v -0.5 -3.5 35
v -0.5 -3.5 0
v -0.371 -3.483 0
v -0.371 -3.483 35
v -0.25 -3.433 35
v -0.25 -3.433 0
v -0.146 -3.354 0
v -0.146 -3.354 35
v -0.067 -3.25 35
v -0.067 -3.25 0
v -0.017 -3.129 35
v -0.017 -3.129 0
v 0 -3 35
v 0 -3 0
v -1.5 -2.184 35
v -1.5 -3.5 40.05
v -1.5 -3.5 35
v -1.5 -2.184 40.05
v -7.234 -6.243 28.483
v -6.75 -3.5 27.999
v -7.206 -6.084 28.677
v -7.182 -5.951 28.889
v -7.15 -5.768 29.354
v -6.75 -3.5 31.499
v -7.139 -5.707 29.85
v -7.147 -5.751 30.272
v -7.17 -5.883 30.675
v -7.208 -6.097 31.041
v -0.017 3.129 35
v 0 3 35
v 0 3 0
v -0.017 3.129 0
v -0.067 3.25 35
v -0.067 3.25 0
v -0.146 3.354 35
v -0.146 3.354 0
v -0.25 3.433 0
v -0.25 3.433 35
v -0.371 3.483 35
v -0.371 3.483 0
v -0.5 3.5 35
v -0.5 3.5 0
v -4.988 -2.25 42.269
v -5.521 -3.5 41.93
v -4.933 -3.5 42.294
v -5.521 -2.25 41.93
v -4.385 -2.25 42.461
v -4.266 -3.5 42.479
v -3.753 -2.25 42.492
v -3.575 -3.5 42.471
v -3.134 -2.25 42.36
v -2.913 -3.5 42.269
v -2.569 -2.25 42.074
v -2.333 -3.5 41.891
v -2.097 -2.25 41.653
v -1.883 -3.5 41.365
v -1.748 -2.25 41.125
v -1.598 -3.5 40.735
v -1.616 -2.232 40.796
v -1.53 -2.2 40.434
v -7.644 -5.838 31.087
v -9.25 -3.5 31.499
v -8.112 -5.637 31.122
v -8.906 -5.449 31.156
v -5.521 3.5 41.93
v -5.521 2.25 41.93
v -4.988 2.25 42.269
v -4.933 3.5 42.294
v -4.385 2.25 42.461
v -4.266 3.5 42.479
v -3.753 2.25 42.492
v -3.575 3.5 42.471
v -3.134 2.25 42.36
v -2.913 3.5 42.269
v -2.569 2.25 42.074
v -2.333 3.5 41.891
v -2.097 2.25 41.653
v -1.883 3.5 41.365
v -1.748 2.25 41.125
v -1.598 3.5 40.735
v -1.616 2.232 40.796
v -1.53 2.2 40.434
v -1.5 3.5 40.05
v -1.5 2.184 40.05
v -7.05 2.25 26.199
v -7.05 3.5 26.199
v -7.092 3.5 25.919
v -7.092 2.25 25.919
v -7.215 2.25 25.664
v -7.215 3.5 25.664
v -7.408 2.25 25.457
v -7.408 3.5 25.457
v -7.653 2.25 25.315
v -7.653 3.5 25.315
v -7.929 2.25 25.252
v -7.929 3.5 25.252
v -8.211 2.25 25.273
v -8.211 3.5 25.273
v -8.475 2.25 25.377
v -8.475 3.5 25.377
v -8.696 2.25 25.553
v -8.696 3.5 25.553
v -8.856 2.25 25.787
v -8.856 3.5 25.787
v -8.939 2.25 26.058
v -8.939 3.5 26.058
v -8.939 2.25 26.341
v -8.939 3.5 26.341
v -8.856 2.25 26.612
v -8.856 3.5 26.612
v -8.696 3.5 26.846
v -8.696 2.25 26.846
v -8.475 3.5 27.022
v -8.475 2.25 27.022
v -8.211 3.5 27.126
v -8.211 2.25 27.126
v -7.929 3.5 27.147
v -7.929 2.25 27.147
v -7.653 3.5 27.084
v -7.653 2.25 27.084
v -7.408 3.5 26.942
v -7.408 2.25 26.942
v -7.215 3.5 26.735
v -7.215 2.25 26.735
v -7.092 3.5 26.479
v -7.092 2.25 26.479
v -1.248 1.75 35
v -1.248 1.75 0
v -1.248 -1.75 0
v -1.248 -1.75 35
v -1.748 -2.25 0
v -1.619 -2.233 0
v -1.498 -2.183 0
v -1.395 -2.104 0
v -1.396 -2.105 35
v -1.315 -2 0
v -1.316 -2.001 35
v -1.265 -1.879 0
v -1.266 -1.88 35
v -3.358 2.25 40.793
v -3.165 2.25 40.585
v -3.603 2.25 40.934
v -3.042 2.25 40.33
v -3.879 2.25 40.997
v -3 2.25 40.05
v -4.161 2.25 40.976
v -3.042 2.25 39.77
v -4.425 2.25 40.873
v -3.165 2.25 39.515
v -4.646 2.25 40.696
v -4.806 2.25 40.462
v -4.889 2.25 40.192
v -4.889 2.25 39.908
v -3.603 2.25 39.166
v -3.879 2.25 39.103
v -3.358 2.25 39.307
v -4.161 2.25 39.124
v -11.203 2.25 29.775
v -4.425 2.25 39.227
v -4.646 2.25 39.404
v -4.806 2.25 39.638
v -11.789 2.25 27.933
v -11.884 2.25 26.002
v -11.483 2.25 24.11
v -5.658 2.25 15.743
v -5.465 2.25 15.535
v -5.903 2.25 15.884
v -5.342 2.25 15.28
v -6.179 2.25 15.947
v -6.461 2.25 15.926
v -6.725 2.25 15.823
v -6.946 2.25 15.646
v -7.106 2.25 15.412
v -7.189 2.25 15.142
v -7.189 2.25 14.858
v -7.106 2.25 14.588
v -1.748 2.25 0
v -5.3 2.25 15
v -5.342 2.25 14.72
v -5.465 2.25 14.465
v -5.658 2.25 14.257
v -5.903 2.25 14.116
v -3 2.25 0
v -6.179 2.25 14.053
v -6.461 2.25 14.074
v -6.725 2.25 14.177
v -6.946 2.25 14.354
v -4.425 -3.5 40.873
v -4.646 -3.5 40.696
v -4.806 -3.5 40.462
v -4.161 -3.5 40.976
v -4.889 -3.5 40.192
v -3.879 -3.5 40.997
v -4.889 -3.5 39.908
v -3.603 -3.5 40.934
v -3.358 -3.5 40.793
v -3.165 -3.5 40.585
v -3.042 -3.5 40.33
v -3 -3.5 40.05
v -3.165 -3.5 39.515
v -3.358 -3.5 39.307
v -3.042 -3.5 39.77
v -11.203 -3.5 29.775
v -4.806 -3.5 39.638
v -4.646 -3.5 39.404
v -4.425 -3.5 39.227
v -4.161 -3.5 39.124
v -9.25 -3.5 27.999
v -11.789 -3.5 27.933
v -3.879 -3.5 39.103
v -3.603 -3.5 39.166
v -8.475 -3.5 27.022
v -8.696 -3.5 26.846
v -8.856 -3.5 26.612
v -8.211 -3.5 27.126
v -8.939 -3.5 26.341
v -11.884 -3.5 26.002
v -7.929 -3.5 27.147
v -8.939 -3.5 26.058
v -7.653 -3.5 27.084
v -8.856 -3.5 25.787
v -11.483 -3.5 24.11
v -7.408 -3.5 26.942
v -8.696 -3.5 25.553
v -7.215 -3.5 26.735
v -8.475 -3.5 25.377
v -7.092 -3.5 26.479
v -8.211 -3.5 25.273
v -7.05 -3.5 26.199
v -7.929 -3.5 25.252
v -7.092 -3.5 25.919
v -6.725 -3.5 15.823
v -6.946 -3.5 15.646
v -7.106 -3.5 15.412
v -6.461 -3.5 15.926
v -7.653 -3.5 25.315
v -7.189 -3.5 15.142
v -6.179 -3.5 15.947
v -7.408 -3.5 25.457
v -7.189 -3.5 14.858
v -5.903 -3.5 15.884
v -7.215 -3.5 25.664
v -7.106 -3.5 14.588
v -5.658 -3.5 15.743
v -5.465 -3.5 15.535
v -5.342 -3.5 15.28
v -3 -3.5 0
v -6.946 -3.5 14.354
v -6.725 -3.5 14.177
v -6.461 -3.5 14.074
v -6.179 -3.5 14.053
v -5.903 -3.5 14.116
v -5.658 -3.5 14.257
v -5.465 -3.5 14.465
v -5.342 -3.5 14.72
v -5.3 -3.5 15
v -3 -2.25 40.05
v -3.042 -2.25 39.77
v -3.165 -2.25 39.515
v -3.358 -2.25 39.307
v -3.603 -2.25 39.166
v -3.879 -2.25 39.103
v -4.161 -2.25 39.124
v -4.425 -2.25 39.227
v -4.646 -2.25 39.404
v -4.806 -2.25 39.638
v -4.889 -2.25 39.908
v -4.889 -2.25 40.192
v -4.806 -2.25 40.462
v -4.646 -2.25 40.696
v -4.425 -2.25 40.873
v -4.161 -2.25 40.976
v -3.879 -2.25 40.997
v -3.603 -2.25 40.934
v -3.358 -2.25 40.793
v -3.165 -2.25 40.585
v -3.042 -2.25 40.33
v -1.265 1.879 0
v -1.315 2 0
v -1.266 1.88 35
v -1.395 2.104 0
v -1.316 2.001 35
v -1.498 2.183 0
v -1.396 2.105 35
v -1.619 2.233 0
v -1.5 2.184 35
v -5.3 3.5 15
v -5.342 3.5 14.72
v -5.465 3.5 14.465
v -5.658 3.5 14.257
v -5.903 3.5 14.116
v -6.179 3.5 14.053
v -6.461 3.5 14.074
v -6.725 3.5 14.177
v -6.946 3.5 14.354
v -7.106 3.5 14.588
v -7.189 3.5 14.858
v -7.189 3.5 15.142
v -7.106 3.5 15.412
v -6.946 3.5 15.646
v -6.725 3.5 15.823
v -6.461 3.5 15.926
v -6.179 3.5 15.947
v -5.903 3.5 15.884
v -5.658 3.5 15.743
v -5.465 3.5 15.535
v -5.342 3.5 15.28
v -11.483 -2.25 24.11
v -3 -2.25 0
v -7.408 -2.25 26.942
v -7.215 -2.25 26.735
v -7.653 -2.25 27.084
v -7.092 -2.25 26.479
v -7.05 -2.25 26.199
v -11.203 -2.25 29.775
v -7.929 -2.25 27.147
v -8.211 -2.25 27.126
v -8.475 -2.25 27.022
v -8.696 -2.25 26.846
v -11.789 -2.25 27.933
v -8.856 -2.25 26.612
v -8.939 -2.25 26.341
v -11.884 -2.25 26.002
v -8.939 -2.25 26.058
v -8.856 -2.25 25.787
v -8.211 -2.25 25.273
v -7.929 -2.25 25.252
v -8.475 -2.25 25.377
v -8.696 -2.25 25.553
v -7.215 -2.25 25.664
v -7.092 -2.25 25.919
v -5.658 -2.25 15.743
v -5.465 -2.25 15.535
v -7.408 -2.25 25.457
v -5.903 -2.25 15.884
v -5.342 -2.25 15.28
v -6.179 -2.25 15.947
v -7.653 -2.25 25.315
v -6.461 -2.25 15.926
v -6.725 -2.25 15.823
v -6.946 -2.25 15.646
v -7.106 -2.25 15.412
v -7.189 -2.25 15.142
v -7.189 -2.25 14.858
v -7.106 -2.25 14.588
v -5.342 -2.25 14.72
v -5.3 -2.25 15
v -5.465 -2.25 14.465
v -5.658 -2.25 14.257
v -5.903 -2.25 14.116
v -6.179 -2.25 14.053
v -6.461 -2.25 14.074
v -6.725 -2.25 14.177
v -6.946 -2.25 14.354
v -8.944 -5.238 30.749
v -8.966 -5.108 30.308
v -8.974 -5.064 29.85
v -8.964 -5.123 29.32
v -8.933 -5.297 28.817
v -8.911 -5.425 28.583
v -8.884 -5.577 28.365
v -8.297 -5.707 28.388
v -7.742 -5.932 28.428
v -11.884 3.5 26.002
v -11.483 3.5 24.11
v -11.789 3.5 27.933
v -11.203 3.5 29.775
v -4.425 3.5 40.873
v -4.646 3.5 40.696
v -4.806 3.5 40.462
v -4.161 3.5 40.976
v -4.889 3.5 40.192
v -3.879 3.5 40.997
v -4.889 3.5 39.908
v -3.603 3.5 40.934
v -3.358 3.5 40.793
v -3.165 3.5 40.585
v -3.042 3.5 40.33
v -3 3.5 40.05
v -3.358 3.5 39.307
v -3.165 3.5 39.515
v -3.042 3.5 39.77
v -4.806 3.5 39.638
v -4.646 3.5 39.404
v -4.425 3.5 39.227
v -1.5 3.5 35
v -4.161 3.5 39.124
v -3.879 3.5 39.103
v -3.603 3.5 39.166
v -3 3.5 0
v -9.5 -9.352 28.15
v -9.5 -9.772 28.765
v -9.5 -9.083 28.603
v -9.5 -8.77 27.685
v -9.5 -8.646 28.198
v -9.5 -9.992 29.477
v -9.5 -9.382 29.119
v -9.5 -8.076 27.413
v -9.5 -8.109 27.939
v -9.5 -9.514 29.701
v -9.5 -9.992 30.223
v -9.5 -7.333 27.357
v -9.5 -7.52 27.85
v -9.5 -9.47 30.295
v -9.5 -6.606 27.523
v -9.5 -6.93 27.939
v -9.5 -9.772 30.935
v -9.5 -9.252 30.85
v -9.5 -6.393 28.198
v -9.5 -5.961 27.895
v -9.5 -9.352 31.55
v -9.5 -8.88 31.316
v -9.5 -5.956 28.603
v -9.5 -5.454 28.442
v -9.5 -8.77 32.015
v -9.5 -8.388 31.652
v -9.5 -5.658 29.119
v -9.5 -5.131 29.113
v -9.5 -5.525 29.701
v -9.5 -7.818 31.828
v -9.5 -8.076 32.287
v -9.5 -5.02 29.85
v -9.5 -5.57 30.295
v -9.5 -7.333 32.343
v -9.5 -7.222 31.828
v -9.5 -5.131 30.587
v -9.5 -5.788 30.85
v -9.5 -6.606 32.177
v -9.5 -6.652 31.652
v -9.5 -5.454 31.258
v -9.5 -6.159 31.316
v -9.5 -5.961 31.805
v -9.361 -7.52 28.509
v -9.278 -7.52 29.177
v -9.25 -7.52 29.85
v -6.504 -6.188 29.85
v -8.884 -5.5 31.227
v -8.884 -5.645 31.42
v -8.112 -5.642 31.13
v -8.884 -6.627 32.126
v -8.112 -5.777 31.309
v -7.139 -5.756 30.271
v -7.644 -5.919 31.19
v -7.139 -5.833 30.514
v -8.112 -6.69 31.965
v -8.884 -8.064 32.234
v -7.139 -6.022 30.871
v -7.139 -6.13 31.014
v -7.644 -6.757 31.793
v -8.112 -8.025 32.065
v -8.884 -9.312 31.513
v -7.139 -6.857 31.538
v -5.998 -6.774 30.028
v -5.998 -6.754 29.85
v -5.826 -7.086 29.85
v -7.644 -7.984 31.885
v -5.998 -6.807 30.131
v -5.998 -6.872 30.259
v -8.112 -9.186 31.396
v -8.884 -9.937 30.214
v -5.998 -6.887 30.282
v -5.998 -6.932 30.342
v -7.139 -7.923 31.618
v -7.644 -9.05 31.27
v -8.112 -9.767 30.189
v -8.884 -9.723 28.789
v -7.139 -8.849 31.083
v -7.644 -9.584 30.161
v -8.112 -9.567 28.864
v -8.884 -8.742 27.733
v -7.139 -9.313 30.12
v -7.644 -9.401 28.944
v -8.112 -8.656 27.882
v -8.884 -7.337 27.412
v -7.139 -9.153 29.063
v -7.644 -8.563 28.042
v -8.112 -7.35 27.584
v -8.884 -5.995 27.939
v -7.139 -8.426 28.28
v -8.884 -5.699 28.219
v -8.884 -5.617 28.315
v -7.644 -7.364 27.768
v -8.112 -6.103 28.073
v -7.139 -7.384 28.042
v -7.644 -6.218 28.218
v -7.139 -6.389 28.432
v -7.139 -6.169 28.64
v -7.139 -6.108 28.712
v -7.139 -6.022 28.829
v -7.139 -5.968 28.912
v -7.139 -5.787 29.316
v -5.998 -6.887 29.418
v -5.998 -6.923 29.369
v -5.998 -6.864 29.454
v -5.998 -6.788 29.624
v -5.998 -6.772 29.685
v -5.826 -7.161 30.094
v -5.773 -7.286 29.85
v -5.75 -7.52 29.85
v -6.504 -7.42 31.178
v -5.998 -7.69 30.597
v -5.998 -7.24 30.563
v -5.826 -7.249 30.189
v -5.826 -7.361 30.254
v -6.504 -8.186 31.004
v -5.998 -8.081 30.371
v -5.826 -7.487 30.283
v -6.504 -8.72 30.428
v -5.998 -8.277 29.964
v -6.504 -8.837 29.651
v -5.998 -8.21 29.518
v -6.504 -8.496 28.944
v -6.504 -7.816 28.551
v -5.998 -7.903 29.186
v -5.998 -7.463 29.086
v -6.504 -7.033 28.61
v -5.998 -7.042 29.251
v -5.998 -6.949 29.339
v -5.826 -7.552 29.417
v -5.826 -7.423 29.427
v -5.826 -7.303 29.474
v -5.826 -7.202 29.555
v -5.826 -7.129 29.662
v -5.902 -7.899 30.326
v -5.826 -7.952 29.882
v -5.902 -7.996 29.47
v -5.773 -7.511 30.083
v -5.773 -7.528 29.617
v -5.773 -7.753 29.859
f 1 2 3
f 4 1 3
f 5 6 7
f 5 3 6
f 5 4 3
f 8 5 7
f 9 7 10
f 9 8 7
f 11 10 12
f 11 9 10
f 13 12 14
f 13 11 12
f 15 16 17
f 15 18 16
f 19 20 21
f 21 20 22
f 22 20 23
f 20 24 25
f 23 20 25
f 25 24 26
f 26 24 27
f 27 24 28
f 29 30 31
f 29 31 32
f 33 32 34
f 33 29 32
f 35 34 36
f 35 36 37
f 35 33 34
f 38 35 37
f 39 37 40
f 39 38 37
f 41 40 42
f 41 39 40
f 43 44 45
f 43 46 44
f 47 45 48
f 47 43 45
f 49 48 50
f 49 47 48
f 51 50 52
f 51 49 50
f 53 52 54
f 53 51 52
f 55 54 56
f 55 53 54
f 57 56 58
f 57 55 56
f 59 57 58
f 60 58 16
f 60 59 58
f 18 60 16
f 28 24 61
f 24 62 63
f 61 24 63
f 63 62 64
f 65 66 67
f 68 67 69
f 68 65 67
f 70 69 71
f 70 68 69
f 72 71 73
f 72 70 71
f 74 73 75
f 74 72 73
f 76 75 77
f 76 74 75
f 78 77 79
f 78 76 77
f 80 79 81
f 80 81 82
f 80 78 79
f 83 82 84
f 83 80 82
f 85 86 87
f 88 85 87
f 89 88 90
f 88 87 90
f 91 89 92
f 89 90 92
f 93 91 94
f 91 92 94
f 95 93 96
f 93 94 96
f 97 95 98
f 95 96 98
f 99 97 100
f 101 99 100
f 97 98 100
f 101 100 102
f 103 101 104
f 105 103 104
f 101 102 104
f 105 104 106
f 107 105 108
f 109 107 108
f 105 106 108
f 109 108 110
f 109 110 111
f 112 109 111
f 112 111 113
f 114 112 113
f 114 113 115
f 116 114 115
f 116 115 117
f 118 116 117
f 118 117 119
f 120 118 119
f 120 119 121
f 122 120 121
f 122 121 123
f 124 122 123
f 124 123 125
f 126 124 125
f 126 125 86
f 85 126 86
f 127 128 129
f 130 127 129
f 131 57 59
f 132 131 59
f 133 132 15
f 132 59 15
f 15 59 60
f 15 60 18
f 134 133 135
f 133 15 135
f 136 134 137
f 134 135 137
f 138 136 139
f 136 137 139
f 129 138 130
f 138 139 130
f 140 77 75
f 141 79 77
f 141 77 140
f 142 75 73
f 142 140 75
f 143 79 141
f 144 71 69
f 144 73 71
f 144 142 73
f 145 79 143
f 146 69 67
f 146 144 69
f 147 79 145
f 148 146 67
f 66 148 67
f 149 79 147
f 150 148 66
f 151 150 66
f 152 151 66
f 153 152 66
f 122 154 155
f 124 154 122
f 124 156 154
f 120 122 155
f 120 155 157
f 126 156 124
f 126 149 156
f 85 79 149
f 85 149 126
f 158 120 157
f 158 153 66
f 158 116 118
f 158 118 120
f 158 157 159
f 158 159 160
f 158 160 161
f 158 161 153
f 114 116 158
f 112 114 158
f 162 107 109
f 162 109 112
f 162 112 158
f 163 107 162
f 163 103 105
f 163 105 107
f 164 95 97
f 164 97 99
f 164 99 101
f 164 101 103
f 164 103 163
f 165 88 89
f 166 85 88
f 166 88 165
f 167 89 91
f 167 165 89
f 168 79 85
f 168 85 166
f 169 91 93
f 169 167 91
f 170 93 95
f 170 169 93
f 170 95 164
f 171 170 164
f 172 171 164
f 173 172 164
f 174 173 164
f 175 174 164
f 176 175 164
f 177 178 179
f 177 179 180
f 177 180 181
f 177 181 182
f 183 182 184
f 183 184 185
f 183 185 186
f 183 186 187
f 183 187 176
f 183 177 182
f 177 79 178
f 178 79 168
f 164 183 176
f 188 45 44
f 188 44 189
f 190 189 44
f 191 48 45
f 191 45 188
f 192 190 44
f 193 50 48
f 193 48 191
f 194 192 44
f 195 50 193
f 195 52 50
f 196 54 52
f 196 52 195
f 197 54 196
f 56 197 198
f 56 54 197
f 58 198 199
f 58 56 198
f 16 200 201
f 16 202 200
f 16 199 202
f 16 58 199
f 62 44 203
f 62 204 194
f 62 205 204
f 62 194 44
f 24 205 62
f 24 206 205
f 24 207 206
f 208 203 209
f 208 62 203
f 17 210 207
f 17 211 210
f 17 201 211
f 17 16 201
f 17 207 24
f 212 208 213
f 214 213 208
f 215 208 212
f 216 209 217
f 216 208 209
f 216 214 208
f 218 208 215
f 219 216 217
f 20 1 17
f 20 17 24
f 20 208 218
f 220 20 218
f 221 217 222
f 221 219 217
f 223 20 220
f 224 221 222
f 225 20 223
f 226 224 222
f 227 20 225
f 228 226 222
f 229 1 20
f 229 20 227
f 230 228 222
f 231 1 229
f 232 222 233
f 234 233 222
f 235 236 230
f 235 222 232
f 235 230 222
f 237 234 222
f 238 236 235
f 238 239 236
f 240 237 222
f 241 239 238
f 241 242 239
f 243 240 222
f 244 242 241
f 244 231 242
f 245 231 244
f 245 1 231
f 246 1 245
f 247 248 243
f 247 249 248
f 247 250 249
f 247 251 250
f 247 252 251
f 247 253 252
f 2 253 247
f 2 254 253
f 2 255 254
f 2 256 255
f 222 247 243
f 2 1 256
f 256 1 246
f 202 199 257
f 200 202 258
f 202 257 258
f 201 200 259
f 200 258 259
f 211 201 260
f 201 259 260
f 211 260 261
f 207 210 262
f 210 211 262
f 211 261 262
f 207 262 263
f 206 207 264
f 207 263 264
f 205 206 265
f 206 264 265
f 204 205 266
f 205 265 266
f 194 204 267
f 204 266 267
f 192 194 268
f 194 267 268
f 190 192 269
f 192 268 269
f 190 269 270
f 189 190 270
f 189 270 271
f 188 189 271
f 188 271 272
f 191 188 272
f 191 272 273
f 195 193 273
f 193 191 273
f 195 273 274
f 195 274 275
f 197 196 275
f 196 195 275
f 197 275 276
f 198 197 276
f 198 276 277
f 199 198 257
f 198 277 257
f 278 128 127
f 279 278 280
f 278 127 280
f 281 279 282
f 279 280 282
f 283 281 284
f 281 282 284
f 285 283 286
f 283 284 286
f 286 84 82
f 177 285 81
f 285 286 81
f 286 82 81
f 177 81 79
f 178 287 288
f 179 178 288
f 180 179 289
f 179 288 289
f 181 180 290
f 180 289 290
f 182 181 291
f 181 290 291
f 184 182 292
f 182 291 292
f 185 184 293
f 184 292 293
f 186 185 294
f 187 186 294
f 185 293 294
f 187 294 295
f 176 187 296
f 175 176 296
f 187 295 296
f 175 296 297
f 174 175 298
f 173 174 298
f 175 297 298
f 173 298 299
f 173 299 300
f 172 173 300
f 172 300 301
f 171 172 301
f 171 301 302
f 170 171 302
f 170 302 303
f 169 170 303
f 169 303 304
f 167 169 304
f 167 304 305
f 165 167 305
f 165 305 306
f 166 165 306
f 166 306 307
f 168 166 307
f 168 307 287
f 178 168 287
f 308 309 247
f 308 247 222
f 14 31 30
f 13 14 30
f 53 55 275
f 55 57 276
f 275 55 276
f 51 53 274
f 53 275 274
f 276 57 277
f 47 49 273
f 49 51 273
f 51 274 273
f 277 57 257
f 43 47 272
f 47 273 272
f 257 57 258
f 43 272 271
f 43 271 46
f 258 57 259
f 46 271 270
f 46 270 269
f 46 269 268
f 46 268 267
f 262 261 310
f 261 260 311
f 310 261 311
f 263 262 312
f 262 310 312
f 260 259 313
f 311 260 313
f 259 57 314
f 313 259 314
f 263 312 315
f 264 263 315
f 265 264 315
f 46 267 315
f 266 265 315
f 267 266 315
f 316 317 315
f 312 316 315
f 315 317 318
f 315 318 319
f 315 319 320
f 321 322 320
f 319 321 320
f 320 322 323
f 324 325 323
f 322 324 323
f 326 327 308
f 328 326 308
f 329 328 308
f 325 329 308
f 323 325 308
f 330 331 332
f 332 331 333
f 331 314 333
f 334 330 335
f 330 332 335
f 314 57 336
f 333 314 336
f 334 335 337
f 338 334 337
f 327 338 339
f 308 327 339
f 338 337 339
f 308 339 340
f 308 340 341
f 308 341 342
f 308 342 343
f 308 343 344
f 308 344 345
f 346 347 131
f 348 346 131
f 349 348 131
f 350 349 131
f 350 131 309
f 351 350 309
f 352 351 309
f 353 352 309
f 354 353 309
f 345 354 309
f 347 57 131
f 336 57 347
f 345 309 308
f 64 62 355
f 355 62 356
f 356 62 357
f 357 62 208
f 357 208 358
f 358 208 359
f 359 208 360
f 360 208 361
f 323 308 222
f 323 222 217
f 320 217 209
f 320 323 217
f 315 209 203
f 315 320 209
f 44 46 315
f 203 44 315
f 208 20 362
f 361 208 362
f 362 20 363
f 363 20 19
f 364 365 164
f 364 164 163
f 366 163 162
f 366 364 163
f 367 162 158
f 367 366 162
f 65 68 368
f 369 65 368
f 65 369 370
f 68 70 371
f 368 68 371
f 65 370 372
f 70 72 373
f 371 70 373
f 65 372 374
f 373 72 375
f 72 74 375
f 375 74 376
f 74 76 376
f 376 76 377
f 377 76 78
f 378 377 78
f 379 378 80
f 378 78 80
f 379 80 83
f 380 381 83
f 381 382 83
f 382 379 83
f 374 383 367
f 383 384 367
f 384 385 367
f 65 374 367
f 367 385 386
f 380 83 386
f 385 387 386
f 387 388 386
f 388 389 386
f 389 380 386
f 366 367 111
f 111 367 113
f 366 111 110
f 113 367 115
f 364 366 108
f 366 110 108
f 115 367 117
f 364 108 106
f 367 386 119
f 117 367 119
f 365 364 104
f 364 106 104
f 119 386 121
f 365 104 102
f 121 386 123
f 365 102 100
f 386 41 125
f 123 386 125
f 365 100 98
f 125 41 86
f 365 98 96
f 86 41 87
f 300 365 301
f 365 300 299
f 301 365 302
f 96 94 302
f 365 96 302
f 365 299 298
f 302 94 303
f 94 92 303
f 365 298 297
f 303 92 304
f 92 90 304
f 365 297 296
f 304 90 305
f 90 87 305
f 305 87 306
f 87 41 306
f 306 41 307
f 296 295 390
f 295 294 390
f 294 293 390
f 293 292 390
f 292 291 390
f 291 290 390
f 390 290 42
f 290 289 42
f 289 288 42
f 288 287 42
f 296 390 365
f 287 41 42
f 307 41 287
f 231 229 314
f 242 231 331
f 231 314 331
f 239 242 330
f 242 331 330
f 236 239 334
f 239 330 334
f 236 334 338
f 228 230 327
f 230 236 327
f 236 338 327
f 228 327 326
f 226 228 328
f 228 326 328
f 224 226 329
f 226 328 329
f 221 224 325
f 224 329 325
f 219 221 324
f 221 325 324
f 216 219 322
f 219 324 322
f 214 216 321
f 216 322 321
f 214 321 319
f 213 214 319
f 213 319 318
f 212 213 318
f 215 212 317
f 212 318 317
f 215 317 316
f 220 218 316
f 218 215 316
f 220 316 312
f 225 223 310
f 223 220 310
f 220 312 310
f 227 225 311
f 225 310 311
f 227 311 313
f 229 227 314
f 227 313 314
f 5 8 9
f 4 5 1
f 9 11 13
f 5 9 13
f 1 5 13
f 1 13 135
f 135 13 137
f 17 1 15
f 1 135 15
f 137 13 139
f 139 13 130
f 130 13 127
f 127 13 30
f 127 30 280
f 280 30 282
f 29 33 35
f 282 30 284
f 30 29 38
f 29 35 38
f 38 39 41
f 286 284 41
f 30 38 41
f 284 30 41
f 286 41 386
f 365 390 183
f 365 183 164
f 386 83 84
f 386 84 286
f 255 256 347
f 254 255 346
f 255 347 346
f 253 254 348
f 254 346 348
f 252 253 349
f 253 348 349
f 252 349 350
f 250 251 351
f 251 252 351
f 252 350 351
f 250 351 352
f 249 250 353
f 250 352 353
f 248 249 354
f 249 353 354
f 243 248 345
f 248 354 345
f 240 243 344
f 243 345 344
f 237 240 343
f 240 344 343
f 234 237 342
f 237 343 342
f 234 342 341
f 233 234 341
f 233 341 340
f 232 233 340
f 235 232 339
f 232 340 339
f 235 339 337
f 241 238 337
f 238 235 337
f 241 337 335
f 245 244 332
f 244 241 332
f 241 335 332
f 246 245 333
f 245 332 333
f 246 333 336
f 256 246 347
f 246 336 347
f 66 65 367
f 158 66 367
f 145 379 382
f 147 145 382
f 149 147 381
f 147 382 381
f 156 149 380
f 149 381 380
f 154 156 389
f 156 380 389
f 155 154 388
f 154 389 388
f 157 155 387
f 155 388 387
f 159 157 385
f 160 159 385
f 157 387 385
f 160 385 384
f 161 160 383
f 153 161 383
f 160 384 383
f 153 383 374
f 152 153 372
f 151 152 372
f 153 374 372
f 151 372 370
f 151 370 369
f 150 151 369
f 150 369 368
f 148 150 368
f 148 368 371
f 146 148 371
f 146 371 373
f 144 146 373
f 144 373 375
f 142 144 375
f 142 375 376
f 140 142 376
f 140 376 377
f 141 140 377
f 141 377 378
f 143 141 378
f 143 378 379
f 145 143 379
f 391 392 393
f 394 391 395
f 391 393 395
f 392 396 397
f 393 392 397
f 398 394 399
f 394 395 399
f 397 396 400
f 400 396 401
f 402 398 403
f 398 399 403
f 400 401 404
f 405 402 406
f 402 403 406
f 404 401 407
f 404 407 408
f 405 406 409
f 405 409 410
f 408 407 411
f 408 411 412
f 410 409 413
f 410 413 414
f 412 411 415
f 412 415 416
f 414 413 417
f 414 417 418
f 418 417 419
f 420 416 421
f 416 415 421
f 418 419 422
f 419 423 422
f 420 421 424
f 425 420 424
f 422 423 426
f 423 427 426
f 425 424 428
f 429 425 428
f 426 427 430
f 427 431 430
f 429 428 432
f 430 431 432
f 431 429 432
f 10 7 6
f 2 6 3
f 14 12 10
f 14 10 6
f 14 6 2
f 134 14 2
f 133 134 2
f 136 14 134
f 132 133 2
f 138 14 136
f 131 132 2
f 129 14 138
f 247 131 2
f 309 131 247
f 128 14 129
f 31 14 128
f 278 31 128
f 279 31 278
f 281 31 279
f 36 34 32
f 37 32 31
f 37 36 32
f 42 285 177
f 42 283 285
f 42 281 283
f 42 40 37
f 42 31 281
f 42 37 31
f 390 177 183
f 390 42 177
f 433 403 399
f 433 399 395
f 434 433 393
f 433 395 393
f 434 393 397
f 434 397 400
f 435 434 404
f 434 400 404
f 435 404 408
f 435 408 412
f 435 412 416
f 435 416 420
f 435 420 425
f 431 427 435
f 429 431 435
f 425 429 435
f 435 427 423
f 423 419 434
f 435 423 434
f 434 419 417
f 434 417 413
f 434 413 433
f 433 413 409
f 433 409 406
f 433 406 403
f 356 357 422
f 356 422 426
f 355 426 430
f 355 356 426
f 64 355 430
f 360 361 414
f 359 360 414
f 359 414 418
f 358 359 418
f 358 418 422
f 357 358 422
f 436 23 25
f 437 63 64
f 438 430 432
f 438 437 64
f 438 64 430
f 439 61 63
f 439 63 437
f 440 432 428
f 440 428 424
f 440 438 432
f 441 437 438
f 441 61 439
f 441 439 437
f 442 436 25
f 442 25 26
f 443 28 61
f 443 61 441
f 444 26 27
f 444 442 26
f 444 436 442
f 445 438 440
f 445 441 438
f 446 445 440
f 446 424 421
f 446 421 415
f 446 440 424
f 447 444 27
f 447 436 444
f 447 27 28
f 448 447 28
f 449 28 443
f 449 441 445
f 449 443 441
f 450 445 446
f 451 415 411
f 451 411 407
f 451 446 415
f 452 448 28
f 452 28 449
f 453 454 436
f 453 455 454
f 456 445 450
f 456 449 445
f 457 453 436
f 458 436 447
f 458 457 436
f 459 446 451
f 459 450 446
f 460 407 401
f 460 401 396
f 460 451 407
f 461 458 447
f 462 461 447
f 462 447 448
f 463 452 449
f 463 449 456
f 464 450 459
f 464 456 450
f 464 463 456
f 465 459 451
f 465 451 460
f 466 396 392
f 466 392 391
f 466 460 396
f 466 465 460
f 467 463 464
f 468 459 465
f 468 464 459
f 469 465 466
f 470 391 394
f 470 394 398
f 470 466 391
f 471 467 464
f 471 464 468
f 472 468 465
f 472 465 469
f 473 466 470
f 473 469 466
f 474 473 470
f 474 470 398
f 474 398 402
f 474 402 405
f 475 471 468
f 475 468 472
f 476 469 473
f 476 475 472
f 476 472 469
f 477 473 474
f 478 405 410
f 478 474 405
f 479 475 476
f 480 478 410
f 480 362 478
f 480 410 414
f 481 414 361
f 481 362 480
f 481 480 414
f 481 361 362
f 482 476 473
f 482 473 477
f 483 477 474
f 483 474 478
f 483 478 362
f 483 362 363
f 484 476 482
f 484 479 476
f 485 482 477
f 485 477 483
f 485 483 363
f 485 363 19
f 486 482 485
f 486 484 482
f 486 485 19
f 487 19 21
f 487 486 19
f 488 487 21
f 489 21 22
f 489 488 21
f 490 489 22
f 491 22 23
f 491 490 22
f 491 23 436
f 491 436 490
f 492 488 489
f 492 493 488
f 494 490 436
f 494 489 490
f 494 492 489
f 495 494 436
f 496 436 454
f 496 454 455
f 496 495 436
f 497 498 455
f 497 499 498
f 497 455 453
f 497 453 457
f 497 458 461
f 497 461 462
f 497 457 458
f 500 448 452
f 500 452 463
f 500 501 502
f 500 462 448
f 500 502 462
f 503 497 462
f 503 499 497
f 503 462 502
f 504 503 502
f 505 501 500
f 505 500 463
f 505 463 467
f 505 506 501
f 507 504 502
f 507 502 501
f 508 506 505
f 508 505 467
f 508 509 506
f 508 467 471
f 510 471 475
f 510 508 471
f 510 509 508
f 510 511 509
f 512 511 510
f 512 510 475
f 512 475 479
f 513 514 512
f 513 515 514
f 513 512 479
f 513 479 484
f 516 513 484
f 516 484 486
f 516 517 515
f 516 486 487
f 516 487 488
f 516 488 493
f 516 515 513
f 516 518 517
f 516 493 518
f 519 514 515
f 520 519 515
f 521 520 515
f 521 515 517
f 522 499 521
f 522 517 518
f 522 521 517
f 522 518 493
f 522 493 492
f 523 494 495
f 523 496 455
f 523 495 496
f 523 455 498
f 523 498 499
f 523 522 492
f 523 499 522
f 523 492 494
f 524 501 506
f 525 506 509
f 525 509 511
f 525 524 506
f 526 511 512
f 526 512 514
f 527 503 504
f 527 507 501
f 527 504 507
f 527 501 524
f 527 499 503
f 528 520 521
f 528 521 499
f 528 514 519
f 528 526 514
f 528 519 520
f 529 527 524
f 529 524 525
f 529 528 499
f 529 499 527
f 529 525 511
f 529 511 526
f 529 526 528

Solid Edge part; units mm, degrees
sketch "Sketch1" plane through (0, 0, 0) normal (0, -1, 0) x (1, 0, 0)
  line L0 (0, 0) -> (0, 35)
  line L1 (0, 35) -> (-1.5, 35)
  line L2 (-1.5, 40.05) -> (-1.5, 35)
  arc A0 (-1.5, 40.05) -> (-5.521359, 41.929716) centre (-3.95, 40.05) ccw
  line L3 (-5.521359, 41.929716) -> (-11.202722, 29.775325)
  arc A1 (-11.202722, 29.775325) -> (-11.483188, 24.110112) centre (-4.408345, 26.599409) ccw
  line L4 (-3, 0) -> (-11.483188, 24.110112)
  line L5 (0, 0) -> (-3, 0)
  circle A2 centre (-3.95, 40.05) radius 0.95
  circle A3 centre (-6.25, 15) radius 0.95
  circle A4 centre (-8, 26.199407) radius 0.95
extrude "Protrusion1" add sketch "Sketch1" along normal mid plane 7
sketch "Sketch2" plane through (-1.5, 0, 0) normal (0, 0, -1) x (0, 1, 0)
  line L0 (2.25, 0.251655) -> (-2.25, 0.251655)
  line L1 (-2.25, 0.251655) -> (-2.25, -10.408345)
  line L2 (2.25, -10.408345) -> (-2.25, -10.408345)
  line L3 (2.25, 0.251655) -> (2.25, -10.408345)
extrude "ExtrudedCutout_1" cut sketch "Sketch2" against normal blind 43.130726
fillet "Round_1" radius 0.5 4 edges at (0, 3.5, 17.5) (0, -3.5, 17.5) (-1.248345, -2.25, 17.5) (-1.248345, 2.25, 17.5)
sketch "Sketch3" plane through (-6.204172, -3.5, 21.25) normal (0, -1, 0) x (0.4234554, 0, 0.9059169)
  line L0 (5.35379, 4.484869) -> (5.883109, 3.352473)
  line L1 (5.883109, 3.352473) -> (9.053818, 4.834567)
  line L2 (9.053818, 4.834567) -> (7.99518, 7.099359)
  line L3 (7.99518, 7.099359) -> (4.824471, 5.617265)
  line L4 (4.824471, 5.617265) -> (5.35379, 4.484869)
extrude "ExtrudedProtrusion_3" add sketch "Sketch3" along normal blind 4 draft 10
sketch "Sketch4" plane through (-1.5, 0, 29.85) normal (0, 0, -1) x (1, 0, 0)
  line L0 (-8, 7.519768) -> (-8, 5.019768)
  spline S0 degree 3 poles (-8, 5.019768) (-7.628922, 5.044094) (-6.92286, 5.104892) (-5.68908, 5.582187) (-4.64629, 6.44206) (-4.261677, 7.116492) (-4.25, 7.519768) knots 0 0 0 0 0.211005 0.470829 0.806586 1 1 1 1
revolve "RevolvedProtrusion_2" add sketch "Sketch4" angle 360 about axis through (-9.5, -7.519768, 29.85) along (1, 0, 0)
sketch "Sketch5" plane through (-6.204172, -7.519768, 21.25) normal (0, -1, 0) x (0.4234554, 0, 0.9059169)
  line L0 (6.39525, 6.627463) -> (4.583416, 5.780552)
  arc A0 (6.501113, 6.400984) -> (4.583416, 5.780552) centre (3.060538, 13.761559) cw
revolve "RevolvedCutout1" cut sketch "Sketch5" angle 360 about axis through (-9.5, -7.519768, 29.85) along (1, 0, 0)
properties material "Stainless Steel, 420"
